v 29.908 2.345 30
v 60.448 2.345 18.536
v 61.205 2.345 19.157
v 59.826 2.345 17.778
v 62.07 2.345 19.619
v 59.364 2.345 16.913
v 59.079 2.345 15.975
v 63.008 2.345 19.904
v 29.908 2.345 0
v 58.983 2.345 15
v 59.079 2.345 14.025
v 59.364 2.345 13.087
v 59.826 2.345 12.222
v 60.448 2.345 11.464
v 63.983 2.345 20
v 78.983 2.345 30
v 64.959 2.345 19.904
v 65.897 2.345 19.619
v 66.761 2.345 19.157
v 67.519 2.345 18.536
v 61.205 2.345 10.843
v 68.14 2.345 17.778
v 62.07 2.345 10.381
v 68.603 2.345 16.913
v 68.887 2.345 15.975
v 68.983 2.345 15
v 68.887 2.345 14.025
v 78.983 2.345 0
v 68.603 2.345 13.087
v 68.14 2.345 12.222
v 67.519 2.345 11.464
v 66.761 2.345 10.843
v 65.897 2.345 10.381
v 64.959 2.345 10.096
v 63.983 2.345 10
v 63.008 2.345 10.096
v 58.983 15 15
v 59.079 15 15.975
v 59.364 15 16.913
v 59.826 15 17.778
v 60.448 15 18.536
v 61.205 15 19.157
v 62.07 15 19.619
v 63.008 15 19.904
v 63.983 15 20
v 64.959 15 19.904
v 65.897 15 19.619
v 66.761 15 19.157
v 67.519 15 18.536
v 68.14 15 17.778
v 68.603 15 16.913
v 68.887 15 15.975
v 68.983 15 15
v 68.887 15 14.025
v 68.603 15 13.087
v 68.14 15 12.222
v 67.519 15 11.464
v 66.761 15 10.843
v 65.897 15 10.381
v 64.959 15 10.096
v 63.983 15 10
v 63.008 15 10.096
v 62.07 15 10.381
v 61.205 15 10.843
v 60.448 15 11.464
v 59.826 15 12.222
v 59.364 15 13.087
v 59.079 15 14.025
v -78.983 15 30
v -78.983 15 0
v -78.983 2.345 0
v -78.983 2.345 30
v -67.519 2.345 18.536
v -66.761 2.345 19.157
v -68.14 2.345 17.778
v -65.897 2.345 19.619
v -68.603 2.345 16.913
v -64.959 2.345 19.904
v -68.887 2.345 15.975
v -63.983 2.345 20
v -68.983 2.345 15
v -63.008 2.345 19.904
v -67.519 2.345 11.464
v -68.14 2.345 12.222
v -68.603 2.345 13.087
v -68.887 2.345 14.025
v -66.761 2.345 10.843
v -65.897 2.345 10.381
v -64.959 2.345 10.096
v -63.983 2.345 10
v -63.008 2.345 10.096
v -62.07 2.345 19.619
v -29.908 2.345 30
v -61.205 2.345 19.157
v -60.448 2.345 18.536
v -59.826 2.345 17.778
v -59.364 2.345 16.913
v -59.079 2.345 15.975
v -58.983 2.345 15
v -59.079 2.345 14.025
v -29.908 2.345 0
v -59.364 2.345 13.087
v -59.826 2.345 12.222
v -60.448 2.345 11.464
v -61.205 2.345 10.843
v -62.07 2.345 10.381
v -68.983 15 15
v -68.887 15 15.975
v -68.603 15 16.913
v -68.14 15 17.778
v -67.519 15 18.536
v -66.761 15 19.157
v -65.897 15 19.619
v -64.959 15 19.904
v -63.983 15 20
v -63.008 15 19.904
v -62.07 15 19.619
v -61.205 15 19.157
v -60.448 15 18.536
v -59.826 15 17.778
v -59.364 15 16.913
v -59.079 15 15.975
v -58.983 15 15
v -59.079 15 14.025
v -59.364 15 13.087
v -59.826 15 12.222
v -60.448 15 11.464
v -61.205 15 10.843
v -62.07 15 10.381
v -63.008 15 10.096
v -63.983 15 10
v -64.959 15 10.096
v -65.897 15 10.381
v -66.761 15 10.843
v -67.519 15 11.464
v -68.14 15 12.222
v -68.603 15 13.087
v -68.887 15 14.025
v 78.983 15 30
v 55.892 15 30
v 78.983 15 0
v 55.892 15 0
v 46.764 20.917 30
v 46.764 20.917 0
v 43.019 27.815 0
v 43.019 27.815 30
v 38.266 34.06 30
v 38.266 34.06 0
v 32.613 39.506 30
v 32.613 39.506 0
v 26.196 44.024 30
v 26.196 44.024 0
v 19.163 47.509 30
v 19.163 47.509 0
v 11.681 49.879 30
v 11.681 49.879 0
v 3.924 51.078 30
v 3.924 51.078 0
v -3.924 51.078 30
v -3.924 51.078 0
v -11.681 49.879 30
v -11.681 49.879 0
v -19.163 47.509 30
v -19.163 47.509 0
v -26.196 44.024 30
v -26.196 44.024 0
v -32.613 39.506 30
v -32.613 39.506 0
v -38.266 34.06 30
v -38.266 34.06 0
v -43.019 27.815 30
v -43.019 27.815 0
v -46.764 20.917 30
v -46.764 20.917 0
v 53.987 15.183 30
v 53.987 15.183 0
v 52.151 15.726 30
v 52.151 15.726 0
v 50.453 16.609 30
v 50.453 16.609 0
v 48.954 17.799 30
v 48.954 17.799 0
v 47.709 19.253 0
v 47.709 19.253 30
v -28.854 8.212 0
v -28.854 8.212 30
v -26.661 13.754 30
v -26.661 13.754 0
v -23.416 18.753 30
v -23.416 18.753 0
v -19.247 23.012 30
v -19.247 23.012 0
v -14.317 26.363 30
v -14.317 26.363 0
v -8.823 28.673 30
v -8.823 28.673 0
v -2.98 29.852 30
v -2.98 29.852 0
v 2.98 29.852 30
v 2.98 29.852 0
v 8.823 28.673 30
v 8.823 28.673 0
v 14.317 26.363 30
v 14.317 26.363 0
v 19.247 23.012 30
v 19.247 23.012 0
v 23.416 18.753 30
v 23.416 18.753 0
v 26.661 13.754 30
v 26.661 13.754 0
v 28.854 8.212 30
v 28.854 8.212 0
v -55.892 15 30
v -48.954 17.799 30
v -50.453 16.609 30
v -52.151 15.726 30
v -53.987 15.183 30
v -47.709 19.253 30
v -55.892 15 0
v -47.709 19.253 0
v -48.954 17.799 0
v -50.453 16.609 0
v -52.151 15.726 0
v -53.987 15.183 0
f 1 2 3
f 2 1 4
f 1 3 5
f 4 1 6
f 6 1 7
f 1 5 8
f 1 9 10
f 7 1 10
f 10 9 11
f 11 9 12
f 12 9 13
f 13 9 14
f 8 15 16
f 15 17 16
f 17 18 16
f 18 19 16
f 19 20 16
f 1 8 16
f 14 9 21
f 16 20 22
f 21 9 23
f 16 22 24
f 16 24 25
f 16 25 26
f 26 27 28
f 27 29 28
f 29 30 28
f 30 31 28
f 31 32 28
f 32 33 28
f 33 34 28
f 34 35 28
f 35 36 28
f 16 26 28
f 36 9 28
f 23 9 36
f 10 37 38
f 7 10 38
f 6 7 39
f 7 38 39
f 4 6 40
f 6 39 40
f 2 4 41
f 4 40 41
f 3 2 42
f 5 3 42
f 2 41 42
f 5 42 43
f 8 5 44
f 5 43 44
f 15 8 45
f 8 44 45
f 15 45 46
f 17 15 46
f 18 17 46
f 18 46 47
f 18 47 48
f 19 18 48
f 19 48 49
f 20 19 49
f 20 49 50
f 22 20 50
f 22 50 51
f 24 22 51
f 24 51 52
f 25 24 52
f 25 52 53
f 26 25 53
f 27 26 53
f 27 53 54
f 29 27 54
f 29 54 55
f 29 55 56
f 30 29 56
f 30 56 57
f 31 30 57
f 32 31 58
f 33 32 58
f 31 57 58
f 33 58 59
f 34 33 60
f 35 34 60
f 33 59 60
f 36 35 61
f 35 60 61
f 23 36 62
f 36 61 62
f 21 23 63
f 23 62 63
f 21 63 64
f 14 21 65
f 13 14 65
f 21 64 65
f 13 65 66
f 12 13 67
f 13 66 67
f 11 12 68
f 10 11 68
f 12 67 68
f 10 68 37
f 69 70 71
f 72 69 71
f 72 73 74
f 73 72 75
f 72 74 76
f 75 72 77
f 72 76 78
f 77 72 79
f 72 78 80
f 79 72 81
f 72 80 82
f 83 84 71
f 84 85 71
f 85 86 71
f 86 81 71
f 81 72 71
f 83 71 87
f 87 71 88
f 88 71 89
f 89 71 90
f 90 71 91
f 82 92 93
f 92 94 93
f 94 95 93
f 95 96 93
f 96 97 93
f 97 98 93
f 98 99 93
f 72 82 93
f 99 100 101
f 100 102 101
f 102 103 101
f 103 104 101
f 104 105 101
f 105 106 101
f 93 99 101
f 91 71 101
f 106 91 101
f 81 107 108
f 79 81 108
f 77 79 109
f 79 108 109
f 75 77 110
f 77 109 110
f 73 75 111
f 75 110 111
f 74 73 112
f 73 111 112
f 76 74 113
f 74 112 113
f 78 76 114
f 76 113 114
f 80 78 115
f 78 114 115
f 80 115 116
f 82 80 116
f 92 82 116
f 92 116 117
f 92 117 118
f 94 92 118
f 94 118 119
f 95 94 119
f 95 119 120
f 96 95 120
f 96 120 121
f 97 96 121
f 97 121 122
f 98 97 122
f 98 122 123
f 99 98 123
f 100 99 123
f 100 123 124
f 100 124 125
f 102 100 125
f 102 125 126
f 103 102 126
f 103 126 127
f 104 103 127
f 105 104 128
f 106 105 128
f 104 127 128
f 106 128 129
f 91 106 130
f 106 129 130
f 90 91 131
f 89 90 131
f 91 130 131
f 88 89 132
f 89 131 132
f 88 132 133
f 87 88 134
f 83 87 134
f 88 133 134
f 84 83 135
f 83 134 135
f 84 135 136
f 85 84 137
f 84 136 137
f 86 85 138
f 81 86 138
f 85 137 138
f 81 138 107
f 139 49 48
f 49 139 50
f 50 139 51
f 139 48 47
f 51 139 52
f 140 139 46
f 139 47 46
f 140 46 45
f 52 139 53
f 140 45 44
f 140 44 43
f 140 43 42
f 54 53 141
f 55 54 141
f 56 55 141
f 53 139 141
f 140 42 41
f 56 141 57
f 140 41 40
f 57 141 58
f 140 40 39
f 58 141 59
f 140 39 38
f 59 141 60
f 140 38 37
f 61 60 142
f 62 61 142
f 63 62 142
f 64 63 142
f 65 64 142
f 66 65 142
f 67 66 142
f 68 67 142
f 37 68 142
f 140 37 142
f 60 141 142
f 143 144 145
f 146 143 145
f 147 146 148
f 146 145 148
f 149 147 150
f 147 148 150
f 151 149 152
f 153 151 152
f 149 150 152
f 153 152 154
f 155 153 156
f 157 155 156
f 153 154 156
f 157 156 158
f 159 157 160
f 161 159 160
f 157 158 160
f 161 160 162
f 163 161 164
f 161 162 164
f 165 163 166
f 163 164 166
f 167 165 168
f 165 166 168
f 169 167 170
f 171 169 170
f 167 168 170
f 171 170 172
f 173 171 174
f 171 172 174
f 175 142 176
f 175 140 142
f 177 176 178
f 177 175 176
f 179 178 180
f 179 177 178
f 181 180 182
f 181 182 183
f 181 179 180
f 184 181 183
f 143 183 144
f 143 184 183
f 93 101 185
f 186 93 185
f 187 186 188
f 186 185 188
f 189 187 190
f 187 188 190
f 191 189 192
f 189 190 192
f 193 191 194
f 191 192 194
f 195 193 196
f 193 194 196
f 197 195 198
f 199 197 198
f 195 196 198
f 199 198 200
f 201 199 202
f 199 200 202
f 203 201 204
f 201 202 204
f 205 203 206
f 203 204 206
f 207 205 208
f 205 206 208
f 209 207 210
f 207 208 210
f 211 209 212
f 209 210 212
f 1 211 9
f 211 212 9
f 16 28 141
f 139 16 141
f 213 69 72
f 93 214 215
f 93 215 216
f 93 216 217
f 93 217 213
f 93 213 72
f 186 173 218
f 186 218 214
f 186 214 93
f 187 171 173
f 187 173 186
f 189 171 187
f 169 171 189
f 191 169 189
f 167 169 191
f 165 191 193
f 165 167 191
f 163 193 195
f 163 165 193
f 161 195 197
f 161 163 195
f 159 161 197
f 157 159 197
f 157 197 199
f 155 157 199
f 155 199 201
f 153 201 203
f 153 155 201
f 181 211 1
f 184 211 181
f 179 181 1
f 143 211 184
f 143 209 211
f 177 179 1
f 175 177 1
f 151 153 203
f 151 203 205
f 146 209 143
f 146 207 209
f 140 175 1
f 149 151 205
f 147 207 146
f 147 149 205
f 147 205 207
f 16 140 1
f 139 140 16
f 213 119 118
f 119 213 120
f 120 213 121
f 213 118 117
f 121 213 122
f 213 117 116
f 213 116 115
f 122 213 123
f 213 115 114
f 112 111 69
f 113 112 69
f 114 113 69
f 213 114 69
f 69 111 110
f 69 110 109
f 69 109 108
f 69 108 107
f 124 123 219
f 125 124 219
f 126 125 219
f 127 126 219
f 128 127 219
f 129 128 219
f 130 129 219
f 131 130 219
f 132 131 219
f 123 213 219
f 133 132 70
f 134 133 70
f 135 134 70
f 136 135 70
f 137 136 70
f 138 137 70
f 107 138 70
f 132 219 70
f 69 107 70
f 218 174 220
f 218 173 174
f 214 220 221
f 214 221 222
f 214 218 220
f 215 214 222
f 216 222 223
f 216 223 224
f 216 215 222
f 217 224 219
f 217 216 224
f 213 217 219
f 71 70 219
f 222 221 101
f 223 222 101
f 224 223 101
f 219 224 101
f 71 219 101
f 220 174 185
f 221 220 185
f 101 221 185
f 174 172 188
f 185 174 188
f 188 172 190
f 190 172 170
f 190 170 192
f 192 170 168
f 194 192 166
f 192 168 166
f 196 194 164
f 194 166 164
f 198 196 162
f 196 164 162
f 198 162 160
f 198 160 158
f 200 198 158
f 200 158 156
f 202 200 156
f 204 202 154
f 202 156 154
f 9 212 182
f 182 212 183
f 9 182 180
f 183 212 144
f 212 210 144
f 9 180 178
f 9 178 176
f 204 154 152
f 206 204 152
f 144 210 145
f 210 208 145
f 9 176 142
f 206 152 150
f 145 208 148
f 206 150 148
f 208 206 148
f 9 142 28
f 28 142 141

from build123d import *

# Parameters (mm, degrees)
RESSALTO_EXTRUS_O1_DEPTH = 30
ESBO_O2_R                = 5
CORTE_EXTRUS_O1_DEPTH    = 30
FILETE1_R                = 10


with BuildPart() as part:
    # Esboço1 → Ressalto-extrusão1 (new body)
    with BuildSketch(Plane.XY):
        with BuildLine():
            Line((-51.174680709, 2.345199545), (-29.908193511, 2.345199545))
            ThreePointArc((-29.908193511, 2.345199545), (0, 30), (29.908193511, 2.345199545))
            Line((29.908193511, 2.345199545), (51.174680709, 2.345199545))
            Line((51.174680709, 2.345199545), (78.983139003, 2.345199545))
            Line((78.983139003, 2.345199545), (78.983139003, 15))
            Line((78.983139003, 15), (48.983139003, 15))
            ThreePointArc((48.983139003, 15), (0, 51.228389654), (-48.983139003, 15))
            Line((-48.983139003, 15), (-78.983139003, 15))
            Line((-78.983139003, 15), (-78.983139003, 2.345199545))
            Line((-78.983139003, 2.345199545), (-51.174680709, 2.345199545))
        make_face()
    extrude(amount=RESSALTO_EXTRUS_O1_DEPTH)

    # Esboço2 → Corte-extrusão1 (cut)
    with BuildSketch(Plane(origin=(0, 15, 0), x_dir=(1, 0, 0), z_dir=(0, 1, 0))):
        with Locations(Location((-63.983139003, -15, 0), (0, 0, 180))):
            Circle(ESBO_O2_R)
        with Locations(Location((63.983139003, -15, 0), (0, 0, 180))):
            Circle(ESBO_O2_R)
    extrude(amount=-CORTE_EXTRUS_O1_DEPTH, mode=Mode.SUBTRACT)

    # Filete1
    filete1_edges = [part.edges().sort_by_distance(p)[0] for p in [
        (48.983139003, 15, 15),
        (-48.983139003, 15, 15),
    ]]
    fillet(filete1_edges, radius=FILETE1_R)


solid = part.part
